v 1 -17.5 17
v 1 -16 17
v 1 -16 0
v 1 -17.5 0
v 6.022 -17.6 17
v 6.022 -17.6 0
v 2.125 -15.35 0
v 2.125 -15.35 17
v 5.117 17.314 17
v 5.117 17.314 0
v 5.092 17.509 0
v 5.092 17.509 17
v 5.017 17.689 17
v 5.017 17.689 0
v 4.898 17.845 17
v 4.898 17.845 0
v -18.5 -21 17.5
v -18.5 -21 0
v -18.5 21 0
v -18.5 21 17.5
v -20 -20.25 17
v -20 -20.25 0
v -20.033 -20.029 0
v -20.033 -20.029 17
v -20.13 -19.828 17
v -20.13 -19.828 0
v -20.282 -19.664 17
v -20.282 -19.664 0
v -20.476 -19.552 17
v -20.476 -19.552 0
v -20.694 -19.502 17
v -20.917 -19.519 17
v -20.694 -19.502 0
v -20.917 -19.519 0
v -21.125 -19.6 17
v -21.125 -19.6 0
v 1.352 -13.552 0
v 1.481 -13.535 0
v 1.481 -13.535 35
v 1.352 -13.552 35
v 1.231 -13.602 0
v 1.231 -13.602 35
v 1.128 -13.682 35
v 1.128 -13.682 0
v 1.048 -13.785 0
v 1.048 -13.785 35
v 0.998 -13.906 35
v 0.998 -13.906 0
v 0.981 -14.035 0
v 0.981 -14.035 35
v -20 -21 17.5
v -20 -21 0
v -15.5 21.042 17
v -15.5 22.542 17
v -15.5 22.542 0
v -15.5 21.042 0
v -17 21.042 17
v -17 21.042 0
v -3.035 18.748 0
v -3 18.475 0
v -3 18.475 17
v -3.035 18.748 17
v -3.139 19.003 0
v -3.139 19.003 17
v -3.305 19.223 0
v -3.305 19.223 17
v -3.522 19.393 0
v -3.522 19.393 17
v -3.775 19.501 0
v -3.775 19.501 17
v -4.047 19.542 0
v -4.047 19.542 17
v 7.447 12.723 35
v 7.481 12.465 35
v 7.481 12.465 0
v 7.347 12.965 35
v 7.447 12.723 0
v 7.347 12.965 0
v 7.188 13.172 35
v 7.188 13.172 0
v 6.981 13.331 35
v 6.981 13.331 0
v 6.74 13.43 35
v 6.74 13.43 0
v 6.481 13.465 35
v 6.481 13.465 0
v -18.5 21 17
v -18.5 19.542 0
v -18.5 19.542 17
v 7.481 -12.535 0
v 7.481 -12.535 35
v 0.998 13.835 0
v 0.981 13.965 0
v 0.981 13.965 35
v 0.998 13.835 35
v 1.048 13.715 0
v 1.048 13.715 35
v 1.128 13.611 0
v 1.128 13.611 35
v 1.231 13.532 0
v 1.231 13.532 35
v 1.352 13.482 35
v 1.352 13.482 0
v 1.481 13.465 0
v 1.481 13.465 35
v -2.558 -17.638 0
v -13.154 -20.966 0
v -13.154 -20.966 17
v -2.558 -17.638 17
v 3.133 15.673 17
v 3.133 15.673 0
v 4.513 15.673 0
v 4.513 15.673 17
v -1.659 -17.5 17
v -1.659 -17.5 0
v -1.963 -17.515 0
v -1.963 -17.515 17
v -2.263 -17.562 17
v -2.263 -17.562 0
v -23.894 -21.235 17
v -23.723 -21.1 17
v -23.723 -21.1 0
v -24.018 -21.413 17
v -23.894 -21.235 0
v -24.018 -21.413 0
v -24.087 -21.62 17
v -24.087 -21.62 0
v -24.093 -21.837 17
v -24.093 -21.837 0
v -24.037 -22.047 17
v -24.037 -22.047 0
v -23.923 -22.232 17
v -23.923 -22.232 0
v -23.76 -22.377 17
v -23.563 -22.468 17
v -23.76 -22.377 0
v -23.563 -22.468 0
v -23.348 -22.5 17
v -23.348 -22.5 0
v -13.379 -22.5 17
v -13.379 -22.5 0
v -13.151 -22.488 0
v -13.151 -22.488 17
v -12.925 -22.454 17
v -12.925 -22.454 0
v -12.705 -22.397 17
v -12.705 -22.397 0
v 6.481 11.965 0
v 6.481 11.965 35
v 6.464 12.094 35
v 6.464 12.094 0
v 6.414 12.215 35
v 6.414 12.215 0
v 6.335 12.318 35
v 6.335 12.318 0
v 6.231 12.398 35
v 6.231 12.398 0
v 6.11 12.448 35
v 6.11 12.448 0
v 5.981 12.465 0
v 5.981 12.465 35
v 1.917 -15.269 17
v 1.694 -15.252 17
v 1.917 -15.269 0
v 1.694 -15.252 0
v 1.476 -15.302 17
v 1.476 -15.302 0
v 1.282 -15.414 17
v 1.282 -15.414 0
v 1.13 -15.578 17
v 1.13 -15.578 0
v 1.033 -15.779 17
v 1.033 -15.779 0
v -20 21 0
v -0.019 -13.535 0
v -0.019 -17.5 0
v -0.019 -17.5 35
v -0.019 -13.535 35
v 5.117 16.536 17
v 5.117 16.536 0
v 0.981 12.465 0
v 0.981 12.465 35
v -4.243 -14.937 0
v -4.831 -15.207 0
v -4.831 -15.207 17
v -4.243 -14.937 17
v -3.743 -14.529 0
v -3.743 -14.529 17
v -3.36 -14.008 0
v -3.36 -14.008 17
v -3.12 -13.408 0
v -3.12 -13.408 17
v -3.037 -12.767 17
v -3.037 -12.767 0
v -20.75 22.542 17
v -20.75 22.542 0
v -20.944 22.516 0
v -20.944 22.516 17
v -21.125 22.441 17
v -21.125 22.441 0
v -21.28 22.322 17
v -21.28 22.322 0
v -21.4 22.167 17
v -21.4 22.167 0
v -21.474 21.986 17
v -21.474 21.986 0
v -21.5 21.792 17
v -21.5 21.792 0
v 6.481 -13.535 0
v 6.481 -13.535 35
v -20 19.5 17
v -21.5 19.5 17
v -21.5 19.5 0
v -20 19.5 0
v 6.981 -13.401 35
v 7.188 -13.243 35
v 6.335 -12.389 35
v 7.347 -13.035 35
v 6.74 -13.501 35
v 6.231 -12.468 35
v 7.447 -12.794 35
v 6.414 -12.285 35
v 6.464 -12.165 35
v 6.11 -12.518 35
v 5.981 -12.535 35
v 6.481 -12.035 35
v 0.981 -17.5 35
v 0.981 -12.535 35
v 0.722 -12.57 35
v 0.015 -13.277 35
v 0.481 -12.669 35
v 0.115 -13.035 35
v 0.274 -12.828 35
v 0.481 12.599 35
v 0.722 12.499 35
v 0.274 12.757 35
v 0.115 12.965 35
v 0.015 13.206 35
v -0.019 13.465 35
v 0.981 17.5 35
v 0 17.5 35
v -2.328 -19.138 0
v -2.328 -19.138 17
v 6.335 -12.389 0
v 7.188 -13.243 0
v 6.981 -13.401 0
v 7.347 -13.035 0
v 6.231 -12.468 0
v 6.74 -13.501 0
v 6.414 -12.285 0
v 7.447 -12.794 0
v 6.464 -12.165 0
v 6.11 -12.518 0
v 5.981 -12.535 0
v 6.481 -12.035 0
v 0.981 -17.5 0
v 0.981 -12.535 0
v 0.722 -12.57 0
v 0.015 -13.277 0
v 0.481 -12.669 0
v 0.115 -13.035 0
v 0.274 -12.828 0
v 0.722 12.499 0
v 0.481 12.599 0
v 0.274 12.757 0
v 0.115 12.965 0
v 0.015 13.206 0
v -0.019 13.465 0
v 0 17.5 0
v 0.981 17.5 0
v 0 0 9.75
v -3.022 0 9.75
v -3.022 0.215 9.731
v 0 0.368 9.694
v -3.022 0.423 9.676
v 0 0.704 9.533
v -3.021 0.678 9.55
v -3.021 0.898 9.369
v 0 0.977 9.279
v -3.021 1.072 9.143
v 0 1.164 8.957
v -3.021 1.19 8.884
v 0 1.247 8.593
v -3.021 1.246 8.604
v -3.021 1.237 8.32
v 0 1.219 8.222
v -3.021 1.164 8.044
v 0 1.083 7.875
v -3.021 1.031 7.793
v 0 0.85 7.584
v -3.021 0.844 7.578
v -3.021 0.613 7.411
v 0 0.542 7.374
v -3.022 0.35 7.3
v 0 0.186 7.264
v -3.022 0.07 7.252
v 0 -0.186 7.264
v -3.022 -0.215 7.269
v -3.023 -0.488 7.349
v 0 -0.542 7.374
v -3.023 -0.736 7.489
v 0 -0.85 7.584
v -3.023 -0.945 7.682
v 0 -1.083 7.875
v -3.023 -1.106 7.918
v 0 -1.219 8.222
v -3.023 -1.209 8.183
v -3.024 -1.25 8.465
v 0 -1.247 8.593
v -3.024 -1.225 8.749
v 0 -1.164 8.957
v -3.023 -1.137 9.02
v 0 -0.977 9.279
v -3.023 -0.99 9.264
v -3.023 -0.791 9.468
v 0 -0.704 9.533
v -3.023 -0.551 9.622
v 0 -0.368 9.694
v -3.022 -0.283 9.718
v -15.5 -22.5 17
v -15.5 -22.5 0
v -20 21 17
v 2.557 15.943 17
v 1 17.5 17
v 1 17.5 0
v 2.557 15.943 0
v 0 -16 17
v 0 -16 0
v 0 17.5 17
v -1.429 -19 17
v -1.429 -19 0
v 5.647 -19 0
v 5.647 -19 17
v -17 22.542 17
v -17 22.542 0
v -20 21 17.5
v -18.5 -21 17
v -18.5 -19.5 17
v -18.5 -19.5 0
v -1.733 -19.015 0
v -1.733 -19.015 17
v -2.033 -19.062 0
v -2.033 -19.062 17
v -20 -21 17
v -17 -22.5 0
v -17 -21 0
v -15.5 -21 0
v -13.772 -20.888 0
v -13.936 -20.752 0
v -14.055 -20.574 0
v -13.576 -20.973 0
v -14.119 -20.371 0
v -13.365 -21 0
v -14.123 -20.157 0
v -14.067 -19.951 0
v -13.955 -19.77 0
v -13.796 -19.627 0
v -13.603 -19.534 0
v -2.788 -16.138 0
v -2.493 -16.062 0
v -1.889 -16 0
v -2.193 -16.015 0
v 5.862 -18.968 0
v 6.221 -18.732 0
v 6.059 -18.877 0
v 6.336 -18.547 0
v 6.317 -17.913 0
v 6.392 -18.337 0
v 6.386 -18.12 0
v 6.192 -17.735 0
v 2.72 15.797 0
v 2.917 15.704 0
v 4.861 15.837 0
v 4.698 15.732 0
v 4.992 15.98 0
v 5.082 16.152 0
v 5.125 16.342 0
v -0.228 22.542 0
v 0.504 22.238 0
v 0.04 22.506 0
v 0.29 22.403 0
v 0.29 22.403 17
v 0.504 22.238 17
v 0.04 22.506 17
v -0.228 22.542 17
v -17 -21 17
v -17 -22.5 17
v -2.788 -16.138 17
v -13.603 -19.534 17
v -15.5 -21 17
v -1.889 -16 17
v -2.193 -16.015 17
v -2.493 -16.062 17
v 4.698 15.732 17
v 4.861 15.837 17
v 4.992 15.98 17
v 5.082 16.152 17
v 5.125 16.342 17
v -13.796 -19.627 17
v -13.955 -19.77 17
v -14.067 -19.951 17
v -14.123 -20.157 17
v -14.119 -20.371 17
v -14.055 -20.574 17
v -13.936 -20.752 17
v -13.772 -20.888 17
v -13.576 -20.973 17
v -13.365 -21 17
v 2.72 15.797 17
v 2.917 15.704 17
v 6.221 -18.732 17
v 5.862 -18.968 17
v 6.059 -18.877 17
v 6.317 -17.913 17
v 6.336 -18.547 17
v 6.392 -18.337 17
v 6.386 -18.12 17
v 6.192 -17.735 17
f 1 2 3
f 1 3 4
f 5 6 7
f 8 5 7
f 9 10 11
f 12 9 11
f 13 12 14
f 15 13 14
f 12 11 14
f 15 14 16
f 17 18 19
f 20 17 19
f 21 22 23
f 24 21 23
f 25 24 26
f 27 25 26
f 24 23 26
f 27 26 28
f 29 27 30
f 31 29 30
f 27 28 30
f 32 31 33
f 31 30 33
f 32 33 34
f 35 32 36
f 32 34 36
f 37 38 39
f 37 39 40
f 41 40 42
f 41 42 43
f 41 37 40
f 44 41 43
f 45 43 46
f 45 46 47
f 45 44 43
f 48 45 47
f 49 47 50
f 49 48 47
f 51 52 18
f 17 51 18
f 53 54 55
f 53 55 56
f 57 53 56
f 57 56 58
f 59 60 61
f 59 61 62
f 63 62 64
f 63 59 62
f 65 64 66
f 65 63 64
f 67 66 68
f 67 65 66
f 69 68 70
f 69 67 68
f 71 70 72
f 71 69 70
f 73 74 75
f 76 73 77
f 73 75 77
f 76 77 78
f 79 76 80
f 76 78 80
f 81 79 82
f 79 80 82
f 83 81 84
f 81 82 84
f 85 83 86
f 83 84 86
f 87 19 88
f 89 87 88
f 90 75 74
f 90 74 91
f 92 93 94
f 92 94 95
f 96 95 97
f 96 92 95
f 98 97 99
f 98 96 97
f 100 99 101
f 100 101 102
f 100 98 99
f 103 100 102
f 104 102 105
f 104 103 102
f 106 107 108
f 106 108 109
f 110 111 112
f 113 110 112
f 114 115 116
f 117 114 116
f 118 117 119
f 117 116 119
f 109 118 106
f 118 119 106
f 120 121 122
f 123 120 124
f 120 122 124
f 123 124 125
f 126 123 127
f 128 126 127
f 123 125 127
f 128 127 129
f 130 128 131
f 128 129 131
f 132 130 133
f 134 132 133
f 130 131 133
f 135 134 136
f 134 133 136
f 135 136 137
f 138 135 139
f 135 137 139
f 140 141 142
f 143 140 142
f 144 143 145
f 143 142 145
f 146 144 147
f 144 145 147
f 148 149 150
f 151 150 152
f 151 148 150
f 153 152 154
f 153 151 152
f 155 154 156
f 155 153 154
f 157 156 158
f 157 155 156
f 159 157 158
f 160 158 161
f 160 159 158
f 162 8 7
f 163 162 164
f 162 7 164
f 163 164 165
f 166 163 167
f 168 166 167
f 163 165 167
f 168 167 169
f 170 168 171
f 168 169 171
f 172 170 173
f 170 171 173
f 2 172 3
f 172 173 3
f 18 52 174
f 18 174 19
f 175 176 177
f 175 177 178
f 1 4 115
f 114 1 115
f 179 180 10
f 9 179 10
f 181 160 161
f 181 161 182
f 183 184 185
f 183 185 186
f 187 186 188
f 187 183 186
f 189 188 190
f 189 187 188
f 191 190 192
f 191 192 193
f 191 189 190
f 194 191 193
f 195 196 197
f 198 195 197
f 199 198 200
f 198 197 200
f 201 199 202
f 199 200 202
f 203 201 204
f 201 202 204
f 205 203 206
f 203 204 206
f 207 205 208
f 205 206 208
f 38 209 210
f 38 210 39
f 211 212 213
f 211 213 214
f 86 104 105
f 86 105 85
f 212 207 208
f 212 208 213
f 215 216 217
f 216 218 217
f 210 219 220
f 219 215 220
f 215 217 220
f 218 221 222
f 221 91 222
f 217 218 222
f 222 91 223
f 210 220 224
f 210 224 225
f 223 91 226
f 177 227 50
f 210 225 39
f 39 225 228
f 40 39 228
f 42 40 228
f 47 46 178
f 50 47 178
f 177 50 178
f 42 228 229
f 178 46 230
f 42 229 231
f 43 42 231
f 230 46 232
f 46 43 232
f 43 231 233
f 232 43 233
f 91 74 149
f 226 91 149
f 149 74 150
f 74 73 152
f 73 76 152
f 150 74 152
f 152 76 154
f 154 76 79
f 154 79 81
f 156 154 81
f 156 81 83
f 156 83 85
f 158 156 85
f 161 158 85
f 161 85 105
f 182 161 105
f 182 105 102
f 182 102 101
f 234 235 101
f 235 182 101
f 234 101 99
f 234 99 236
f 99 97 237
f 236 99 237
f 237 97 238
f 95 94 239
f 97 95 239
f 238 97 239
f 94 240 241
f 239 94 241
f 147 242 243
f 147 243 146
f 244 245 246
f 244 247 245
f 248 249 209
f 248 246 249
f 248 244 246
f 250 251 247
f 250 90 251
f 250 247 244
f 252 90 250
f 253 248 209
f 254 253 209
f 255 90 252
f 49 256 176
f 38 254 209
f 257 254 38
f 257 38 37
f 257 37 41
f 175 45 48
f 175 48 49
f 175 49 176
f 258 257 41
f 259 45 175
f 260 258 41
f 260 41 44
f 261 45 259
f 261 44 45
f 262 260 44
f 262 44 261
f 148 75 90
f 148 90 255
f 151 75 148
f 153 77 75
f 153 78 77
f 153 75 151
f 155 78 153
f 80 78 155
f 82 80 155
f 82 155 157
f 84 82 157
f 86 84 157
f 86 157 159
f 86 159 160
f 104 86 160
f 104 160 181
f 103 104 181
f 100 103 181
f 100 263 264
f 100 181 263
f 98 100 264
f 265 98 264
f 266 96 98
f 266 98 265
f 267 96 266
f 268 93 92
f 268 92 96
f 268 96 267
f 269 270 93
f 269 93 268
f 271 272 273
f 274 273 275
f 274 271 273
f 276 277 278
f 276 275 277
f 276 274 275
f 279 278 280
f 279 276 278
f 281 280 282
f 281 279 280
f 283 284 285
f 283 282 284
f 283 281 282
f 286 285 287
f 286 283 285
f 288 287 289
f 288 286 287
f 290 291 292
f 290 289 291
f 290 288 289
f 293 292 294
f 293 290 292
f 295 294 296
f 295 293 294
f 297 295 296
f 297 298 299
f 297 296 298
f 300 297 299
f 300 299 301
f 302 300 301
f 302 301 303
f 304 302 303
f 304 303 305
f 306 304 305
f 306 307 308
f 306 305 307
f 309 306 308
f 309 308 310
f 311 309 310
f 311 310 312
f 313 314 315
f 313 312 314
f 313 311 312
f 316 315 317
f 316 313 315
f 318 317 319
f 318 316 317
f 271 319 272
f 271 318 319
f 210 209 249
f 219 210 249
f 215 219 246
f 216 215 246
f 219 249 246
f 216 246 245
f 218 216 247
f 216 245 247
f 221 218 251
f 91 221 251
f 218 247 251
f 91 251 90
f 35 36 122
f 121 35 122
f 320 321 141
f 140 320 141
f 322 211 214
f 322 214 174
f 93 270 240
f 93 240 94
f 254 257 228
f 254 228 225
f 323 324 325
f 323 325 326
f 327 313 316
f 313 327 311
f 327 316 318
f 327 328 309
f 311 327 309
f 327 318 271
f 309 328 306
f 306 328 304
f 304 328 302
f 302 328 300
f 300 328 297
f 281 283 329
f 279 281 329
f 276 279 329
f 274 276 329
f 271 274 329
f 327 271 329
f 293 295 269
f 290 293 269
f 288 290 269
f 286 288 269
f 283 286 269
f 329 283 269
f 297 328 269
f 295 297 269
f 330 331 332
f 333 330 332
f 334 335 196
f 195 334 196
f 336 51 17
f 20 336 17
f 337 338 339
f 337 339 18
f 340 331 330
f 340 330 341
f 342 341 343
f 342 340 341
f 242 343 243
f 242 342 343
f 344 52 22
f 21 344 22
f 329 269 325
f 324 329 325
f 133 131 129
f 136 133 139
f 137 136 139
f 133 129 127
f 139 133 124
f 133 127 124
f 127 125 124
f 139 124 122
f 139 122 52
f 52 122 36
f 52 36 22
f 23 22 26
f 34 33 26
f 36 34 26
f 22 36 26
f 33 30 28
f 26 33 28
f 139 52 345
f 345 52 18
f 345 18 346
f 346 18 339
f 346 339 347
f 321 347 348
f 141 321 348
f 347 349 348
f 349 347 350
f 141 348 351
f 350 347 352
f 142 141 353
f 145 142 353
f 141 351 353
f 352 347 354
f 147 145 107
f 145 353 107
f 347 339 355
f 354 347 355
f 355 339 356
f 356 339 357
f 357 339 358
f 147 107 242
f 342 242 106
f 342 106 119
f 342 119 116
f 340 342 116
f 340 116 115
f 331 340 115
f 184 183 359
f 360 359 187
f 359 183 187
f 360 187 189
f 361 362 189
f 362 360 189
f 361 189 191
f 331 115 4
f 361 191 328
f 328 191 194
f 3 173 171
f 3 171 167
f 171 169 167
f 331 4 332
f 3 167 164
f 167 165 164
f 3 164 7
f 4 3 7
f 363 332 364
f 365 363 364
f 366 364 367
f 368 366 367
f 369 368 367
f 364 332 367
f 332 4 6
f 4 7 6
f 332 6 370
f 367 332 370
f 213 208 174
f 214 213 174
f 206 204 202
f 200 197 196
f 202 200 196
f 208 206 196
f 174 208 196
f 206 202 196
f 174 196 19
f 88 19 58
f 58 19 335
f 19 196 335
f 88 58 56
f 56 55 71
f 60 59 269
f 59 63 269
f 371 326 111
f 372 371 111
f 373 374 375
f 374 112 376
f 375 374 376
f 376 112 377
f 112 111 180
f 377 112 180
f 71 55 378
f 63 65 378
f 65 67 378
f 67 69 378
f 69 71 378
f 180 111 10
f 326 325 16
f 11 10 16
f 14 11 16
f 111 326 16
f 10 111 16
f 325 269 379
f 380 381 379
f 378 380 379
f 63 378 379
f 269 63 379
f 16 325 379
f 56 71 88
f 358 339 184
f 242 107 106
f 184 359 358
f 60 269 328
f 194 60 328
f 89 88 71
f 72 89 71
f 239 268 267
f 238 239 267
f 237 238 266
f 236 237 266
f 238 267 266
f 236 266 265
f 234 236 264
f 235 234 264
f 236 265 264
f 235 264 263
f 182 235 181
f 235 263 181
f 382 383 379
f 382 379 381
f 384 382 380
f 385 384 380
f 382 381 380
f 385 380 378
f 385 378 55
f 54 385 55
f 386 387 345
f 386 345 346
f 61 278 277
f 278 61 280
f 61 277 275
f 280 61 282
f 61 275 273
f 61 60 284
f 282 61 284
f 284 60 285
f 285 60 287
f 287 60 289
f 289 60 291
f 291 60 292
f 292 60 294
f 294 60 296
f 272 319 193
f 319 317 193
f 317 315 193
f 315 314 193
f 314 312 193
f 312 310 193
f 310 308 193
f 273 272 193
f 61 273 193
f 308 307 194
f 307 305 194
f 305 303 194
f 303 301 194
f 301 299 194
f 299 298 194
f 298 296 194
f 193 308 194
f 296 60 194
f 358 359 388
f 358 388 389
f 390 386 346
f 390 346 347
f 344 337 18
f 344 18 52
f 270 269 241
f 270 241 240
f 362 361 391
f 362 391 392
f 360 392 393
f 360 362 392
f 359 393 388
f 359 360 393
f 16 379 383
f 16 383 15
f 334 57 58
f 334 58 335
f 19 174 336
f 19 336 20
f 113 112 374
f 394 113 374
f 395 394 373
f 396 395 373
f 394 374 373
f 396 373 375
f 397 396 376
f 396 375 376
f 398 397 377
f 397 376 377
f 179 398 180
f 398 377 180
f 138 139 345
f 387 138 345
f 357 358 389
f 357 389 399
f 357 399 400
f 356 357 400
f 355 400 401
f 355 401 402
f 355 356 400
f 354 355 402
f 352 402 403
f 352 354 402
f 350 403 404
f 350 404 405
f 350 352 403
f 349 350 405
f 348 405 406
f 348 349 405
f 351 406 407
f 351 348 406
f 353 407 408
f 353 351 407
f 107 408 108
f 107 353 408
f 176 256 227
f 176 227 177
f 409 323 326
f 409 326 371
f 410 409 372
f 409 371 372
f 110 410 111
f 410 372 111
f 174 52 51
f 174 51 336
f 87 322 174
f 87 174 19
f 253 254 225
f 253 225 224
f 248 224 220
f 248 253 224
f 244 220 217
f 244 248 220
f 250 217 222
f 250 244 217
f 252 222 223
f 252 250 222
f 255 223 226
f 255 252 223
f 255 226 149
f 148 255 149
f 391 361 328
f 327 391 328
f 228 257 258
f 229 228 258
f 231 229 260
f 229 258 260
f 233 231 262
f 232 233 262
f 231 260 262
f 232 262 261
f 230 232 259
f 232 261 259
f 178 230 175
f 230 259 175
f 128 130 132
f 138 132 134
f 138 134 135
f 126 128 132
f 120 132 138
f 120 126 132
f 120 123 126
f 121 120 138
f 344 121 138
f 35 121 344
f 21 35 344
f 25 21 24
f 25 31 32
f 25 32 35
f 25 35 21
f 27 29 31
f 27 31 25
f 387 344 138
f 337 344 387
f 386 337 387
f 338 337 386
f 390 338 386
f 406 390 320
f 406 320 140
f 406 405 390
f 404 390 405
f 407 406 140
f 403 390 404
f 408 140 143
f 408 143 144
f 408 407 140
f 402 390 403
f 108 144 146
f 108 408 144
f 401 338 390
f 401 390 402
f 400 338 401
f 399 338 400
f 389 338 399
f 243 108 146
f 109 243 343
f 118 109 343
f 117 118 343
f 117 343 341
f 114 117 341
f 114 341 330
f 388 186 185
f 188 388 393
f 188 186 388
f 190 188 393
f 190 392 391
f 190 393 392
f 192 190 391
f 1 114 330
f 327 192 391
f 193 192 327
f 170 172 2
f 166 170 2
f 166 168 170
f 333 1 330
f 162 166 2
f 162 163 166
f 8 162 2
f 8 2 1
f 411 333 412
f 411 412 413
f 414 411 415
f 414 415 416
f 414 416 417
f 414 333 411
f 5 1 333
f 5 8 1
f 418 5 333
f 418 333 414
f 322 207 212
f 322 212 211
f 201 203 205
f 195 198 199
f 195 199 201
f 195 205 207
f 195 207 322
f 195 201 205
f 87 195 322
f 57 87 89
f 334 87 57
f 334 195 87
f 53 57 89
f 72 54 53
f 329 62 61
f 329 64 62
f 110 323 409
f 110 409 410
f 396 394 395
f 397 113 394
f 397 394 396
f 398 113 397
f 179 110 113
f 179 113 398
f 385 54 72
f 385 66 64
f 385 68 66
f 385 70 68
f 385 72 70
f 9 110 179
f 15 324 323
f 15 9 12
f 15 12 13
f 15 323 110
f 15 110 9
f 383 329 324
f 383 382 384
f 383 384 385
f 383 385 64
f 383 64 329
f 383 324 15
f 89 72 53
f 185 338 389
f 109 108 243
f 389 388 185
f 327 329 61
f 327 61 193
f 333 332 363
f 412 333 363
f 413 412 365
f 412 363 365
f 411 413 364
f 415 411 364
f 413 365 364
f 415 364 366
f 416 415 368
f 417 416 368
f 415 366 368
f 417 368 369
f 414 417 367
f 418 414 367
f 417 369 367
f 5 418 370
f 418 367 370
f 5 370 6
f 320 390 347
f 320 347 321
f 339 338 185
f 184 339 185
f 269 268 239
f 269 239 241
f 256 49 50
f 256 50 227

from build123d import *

# Parameters (mm, degrees)
PAD001_DEPTH         = 35
BOX_W                = 1.5
BOX_H                = 42
BOX_DEPTH            = 17.5
CYLINDER_R           = 1.25
CYLINDER_DEPTH       = 10
CYLINDER_PITCH_ANGLE = -90
PAD_DEPTH            = 17


with BuildPart() as din_rail:
    # Sketch001 → Pad001 (new body)
    with BuildSketch(Plane(origin=(0, 17.5, 0), x_dir=(1, 0, 0), z_dir=(0, 0, 1))):
        with BuildLine():
            Line((0, 0), (0.981065, 0))
            Line((0.981065, 0), (0.981065, -3.535445))
            ThreePointArc((0.981065, -3.535445), (1.127512, -3.888998), (1.481065, -4.035445))
            Line((1.481065, -4.035445), (6.481065, -4.035445))
            ThreePointArc((7.481065, -5.035445), (7.188172, -4.328338), (6.481065, -4.035445))
            Line((7.481065, -5.035445), (7.481065, -30.035445))
            ThreePointArc((6.481065, -31.035445), (7.188172, -30.742552), (7.481065, -30.035445))
            Line((6.481065, -31.035445), (1.481065, -31.035445))
            ThreePointArc((1.481065, -31.035445), (1.127512, -31.181892), (0.981065, -31.535445))
            Line((0.981065, -31.535445), (0.981065, -35))
            Line((0.981065, -35), (-0.018935, -35))
            Line((-0.018935, -35), (-0.018935, -31.035445))
            ThreePointArc((0.981065, -30.035445), (0.273958, -30.328338), (-0.018935, -31.035445))
            Line((0.981065, -30.035445), (5.981065, -30.035445))
            ThreePointArc((5.981065, -30.035445), (6.334618, -29.888998), (6.481065, -29.535445))
            Line((6.481065, -29.535445), (6.481065, -5.535445))
            ThreePointArc((6.481065, -5.535445), (6.334618, -5.181892), (5.981065, -5.035445))
            Line((5.981065, -5.035445), (0.981065, -5.035445))
            ThreePointArc((-0.018935, -4.035445), (0.273958, -4.742552), (0.981065, -5.035445))
            Line((-0.018935, -4.035445), (0, 0))
        make_face()
    extrude(amount=PAD001_DEPTH)


with BuildPart() as pcb:
    # Box → Box (new body)
    with BuildSketch(Plane(origin=(-20, -21, 0), x_dir=(1, 0, 0), z_dir=(0, 0, 1))):
        with Locations((0.75, 21)):
            Rectangle(BOX_W, BOX_H)
    extrude(amount=BOX_DEPTH)


with BuildPart() as bracket_hole:
    # Cylinder → Cylinder (new body)
    with BuildSketch(Plane.XY):
        Circle(CYLINDER_R)
    extrude(amount=CYLINDER_DEPTH)


with BuildPart() as bracket_hole_1:
    # Cylinder pitch: moved
    add(bracket_hole.part.rotate(Axis((0, 0, 0), (0, 1, 0)), CYLINDER_PITCH_ANGLE))


with BuildPart() as bracket_hole_2:
    # Cylinder placement: moved
    add(bracket_hole_1.part.moved(Location((5, 0, 8.5))))


with BuildPart() as din_bracket_single:
    # Sketch → Pad (new body)
    with BuildSketch(Plane(origin=(-3, 0, 0), x_dir=(1, 0, 0), z_dir=(0, 0, 1))):
        with BuildLine():
            Line((2.771987, 22.541663), (-12.5, 22.541663))
            Line((-12.5, 22.541663), (-12.5, 21.041663))
            Line((-12.5, 21.041663), (-14, 21.041663))
            Line((-14, 21.041663), (-14, 22.541663))
            Line((-14, 22.541663), (-17.75, 22.541663))
            ThreePointArc((-17.75, 22.541663), (-18.28033, 22.321993), (-18.5, 21.791663))
            Line((-18.5, 21.791663), (-18.5, 19.5))
            Line((-18.5, 19.5), (-17, 19.5))
            Line((-17, 19.5), (-17, 21))
            Line((-17, 21), (-15.5, 21))
            Line((-15.5, 21), (-15.5, 19.541663))
            Line((-15.5, 19.541663), (-1.047056, 19.541663))
            ThreePointArc((0, 18.474809), (-0.305125, 19.222587), (-1.047056, 19.541663))
            Line((0, 18.474809), (-0.037298, -12.767241))
            ThreePointArc((-1.830702, -15.207168), (-0.534684, -14.280711), (-0.037298, -12.767241))
            Line((-15.5, -19.5), (-1.830702, -15.207168))
            Line((-15.5, -19.5), (-15.5, -21))
            Line((-15.5, -21), (-17, -21))
            Line((-17, -21), (-17, -20.25))
            ThreePointArc((-17, -20.25), (-17.375, -19.600481), (-18.125, -19.600481))
            Line((-18.125, -19.600481), (-20.723075, -21.100481))
            ThreePointArc((-20.723075, -21.100481), (-21.072519, -21.944114), (-20.348075, -22.5))
            Line((-20.348075, -22.5), (-14, -22.5))
            Line((-14, -22.5), (-14, -21))
            Line((-14, -21), (-12.5, -21))
            Line((-12.5, -21), (-12.5, -22.5))
            Line((-12.5, -22.5), (-10.37868, -22.5))
            ThreePointArc((-10.37868, -22.5), (-10.037666, -22.474008), (-9.704532, -22.396631))
            Line((0.672204, -19.137825), (-9.704532, -22.396631))
            ThreePointArc((1.571068, -19), (1.116383, -19.034657), (0.672204, -19.137825))
            Line((1.571068, -19), (8.646899, -19))
            ThreePointArc((8.646899, -19), (9.371343, -18.444114), (9.021899, -17.600481))
            Line((9.021899, -17.600481), (5.124786, -15.350481))
            ThreePointArc((5.124786, -15.350481), (4.374786, -15.350481), (3.999786, -16))
            Line((3.999786, -16), (3.999786, -17.5))
            Line((3.999786, -17.5), (1.341069, -17.5))
            ThreePointArc((1.341069, -17.5), (0.886384, -17.534657), (0.442205, -17.637825))
            Line((-10.153969, -20.965545), (0.442205, -17.637825))
            ThreePointArc((-10.6034, -19.534458), (-11.094223, -20.474716), (-10.153969, -20.965545))
            Line((0.212206, -16.137825), (-10.6034, -19.534458))
            ThreePointArc((1.111069, -16), (0.656385, -16.034657), (0.212206, -16.137825))
            Line((1.111069, -16), (2.999786, -16))
            Line((2.999786, -16), (2.999786, 17.5))
            Line((2.999786, 17.5), (3.999786, 17.5))
            Line((3.999786, 17.5), (5.556936, 15.942849))
            ThreePointArc((5.556936, 15.942849), (5.815061, 15.743569), (6.133362, 15.672675))
            Line((6.133362, 15.672675), (7.513396, 15.672675))
            ThreePointArc((7.513396, 15.672675), (7.992308, 15.980285), (8.11731, 16.535582))
            Line((8.11731, 16.535582), (8.11731, 17.314455))
            ThreePointArc((8.11731, 17.314455), (8.06022, 17.601467), (7.897641, 17.844785))
            Line((3.50396, 22.23847), (7.897641, 17.844785))
            ThreePointArc((3.50396, 22.23847), (3.168128, 22.462866), (2.771987, 22.541663))
        make_face()
    extrude(amount=PAD_DEPTH)

    # Cut: cut bracket hole
    add(bracket_hole_2.part, mode=Mode.SUBTRACT)


solid = Compound([din_rail.part, pcb.part, din_bracket_single.part])
